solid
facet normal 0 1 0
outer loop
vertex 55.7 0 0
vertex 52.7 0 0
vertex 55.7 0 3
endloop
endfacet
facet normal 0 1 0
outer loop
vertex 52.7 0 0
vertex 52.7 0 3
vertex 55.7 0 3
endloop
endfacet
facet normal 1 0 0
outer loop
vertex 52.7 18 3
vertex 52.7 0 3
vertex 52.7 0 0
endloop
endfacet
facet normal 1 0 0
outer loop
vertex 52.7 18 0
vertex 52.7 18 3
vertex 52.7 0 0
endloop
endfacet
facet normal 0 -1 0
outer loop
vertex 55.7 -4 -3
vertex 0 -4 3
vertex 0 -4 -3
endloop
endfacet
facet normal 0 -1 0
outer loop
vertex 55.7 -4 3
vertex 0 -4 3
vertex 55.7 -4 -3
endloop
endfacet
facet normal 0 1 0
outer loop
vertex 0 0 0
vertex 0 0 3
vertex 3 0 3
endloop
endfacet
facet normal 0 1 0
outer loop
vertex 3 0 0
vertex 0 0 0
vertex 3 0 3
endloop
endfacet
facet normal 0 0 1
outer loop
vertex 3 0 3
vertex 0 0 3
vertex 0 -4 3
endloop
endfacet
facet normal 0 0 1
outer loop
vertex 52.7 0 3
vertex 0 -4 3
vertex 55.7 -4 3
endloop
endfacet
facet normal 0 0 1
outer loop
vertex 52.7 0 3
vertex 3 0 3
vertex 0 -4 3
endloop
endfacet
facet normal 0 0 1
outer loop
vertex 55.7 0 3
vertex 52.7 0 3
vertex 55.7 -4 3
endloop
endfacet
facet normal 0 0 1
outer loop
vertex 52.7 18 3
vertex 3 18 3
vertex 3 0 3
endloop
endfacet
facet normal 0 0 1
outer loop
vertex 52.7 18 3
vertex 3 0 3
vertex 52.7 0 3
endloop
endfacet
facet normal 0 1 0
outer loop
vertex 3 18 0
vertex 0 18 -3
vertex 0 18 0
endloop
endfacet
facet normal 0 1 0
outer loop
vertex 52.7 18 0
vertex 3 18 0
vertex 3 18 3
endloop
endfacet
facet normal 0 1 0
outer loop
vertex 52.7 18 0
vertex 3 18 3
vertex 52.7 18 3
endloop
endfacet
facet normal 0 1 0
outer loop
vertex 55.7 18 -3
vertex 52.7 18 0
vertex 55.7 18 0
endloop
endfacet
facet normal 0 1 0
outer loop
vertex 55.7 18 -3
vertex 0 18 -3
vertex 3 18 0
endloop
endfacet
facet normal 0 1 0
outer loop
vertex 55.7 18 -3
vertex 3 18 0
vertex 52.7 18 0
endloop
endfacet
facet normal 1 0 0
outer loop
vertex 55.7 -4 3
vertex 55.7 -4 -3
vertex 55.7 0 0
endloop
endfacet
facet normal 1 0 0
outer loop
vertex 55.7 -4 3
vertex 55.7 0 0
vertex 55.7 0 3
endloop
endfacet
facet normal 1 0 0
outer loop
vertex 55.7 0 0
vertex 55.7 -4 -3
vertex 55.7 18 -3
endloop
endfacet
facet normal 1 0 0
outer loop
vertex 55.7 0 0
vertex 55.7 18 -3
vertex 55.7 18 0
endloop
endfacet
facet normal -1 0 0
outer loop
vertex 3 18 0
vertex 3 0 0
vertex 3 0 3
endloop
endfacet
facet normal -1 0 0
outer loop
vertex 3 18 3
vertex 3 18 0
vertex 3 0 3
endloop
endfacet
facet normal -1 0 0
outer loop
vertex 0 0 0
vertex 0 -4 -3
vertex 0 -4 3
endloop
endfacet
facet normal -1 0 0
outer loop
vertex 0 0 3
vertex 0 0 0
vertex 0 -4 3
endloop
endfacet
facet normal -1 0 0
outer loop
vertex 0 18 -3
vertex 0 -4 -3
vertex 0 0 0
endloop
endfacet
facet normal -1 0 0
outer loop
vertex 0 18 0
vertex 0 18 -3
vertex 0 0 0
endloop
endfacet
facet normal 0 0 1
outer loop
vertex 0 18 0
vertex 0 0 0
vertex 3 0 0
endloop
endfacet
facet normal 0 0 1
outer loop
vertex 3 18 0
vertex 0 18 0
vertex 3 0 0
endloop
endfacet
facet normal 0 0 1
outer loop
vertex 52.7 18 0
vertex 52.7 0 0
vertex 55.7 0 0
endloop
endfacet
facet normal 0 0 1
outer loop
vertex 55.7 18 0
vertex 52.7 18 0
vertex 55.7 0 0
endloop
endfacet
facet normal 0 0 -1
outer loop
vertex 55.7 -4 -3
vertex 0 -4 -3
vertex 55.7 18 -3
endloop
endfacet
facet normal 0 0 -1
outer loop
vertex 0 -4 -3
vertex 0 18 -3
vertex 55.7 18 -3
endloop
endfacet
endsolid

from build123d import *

# Parameters (mm, degrees)
EXTRUDE_1_DEPTH = 18
SKETCH_2_W      = 55.7
SKETCH_2_H      = 6
EXTRUDE_2_DEPTH = 4


with BuildPart() as part:
    # 草图1 → 凸台-拉伸1 (new body)
    with BuildSketch(Plane(origin=(0, 0, 0), x_dir=(1, 0, 0), z_dir=(0, 1, 0))):
        Polygon((0, 0), (3, 0), (3, -3), (52.7, -3), (52.7, 0), (55.7, 0), (55.7, 3), (0, 3), align=None)
    extrude(amount=EXTRUDE_1_DEPTH)

    # 草图2 → 凸台-拉伸2 (add)
    with BuildSketch(Plane.XZ):
        with Locations((27.85, 0)):
            Rectangle(SKETCH_2_W, SKETCH_2_H)
    extrude(amount=EXTRUDE_2_DEPTH)


solid = part.part
